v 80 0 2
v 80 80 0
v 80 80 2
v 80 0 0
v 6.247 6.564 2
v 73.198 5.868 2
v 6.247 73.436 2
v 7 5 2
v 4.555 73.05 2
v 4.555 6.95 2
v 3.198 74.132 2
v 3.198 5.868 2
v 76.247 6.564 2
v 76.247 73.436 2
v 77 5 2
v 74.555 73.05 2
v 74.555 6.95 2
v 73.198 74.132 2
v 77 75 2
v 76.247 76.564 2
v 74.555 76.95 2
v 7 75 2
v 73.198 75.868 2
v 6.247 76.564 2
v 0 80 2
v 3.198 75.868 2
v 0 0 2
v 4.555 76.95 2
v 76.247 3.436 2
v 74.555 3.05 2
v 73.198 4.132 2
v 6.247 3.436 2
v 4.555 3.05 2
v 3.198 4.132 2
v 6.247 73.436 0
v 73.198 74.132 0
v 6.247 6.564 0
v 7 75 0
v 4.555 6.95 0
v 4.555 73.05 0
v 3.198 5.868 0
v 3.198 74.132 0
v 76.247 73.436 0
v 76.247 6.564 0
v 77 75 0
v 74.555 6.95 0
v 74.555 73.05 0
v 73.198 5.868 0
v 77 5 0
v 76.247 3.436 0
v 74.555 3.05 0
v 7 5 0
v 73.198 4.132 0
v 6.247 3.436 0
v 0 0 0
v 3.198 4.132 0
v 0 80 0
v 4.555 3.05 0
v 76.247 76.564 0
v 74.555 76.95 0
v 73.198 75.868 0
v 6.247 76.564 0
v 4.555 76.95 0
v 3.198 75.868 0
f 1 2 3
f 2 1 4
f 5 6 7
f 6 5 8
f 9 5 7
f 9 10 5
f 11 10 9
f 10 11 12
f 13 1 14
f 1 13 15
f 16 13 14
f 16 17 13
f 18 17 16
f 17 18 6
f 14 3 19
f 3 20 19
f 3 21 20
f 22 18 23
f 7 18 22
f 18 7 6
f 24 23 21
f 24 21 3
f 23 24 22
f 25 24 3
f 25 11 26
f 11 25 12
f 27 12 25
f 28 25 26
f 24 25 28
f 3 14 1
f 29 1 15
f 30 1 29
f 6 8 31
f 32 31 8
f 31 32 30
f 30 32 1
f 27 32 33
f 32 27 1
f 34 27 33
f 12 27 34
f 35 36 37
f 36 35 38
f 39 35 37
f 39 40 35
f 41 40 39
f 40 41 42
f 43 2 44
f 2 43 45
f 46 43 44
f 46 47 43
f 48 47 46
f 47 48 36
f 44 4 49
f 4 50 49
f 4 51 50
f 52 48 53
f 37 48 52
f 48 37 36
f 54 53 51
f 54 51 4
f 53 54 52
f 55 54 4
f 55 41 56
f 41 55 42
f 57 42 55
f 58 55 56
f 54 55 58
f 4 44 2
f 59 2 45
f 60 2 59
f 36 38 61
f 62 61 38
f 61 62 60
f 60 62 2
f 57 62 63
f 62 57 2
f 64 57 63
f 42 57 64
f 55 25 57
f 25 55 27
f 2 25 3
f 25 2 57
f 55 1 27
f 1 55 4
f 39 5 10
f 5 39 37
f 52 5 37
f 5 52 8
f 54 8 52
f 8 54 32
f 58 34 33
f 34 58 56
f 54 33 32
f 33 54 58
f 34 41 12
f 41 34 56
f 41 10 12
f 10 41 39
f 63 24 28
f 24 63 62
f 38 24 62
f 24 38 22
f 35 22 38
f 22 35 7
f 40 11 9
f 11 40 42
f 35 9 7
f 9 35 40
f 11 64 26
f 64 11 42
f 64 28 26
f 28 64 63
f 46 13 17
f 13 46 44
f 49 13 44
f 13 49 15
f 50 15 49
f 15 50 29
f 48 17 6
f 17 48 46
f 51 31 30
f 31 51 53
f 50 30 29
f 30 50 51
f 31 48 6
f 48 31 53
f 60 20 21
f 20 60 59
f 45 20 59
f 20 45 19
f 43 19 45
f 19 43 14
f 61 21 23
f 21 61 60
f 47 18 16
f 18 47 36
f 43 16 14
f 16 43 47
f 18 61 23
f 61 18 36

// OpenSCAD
difference() {
    cube([80, 80, 2]);
    translate([5,5,0]) {
        cylinder(d=4, h=5);
    }
    translate([5,75,0]) {
        cylinder(d=4, h=5);
    }
    translate([75,5,0]) {
        cylinder(d=4, h=5);
    }
    translate([75,75,0]) {
        cylinder(d=4, h=5);
    }
};
